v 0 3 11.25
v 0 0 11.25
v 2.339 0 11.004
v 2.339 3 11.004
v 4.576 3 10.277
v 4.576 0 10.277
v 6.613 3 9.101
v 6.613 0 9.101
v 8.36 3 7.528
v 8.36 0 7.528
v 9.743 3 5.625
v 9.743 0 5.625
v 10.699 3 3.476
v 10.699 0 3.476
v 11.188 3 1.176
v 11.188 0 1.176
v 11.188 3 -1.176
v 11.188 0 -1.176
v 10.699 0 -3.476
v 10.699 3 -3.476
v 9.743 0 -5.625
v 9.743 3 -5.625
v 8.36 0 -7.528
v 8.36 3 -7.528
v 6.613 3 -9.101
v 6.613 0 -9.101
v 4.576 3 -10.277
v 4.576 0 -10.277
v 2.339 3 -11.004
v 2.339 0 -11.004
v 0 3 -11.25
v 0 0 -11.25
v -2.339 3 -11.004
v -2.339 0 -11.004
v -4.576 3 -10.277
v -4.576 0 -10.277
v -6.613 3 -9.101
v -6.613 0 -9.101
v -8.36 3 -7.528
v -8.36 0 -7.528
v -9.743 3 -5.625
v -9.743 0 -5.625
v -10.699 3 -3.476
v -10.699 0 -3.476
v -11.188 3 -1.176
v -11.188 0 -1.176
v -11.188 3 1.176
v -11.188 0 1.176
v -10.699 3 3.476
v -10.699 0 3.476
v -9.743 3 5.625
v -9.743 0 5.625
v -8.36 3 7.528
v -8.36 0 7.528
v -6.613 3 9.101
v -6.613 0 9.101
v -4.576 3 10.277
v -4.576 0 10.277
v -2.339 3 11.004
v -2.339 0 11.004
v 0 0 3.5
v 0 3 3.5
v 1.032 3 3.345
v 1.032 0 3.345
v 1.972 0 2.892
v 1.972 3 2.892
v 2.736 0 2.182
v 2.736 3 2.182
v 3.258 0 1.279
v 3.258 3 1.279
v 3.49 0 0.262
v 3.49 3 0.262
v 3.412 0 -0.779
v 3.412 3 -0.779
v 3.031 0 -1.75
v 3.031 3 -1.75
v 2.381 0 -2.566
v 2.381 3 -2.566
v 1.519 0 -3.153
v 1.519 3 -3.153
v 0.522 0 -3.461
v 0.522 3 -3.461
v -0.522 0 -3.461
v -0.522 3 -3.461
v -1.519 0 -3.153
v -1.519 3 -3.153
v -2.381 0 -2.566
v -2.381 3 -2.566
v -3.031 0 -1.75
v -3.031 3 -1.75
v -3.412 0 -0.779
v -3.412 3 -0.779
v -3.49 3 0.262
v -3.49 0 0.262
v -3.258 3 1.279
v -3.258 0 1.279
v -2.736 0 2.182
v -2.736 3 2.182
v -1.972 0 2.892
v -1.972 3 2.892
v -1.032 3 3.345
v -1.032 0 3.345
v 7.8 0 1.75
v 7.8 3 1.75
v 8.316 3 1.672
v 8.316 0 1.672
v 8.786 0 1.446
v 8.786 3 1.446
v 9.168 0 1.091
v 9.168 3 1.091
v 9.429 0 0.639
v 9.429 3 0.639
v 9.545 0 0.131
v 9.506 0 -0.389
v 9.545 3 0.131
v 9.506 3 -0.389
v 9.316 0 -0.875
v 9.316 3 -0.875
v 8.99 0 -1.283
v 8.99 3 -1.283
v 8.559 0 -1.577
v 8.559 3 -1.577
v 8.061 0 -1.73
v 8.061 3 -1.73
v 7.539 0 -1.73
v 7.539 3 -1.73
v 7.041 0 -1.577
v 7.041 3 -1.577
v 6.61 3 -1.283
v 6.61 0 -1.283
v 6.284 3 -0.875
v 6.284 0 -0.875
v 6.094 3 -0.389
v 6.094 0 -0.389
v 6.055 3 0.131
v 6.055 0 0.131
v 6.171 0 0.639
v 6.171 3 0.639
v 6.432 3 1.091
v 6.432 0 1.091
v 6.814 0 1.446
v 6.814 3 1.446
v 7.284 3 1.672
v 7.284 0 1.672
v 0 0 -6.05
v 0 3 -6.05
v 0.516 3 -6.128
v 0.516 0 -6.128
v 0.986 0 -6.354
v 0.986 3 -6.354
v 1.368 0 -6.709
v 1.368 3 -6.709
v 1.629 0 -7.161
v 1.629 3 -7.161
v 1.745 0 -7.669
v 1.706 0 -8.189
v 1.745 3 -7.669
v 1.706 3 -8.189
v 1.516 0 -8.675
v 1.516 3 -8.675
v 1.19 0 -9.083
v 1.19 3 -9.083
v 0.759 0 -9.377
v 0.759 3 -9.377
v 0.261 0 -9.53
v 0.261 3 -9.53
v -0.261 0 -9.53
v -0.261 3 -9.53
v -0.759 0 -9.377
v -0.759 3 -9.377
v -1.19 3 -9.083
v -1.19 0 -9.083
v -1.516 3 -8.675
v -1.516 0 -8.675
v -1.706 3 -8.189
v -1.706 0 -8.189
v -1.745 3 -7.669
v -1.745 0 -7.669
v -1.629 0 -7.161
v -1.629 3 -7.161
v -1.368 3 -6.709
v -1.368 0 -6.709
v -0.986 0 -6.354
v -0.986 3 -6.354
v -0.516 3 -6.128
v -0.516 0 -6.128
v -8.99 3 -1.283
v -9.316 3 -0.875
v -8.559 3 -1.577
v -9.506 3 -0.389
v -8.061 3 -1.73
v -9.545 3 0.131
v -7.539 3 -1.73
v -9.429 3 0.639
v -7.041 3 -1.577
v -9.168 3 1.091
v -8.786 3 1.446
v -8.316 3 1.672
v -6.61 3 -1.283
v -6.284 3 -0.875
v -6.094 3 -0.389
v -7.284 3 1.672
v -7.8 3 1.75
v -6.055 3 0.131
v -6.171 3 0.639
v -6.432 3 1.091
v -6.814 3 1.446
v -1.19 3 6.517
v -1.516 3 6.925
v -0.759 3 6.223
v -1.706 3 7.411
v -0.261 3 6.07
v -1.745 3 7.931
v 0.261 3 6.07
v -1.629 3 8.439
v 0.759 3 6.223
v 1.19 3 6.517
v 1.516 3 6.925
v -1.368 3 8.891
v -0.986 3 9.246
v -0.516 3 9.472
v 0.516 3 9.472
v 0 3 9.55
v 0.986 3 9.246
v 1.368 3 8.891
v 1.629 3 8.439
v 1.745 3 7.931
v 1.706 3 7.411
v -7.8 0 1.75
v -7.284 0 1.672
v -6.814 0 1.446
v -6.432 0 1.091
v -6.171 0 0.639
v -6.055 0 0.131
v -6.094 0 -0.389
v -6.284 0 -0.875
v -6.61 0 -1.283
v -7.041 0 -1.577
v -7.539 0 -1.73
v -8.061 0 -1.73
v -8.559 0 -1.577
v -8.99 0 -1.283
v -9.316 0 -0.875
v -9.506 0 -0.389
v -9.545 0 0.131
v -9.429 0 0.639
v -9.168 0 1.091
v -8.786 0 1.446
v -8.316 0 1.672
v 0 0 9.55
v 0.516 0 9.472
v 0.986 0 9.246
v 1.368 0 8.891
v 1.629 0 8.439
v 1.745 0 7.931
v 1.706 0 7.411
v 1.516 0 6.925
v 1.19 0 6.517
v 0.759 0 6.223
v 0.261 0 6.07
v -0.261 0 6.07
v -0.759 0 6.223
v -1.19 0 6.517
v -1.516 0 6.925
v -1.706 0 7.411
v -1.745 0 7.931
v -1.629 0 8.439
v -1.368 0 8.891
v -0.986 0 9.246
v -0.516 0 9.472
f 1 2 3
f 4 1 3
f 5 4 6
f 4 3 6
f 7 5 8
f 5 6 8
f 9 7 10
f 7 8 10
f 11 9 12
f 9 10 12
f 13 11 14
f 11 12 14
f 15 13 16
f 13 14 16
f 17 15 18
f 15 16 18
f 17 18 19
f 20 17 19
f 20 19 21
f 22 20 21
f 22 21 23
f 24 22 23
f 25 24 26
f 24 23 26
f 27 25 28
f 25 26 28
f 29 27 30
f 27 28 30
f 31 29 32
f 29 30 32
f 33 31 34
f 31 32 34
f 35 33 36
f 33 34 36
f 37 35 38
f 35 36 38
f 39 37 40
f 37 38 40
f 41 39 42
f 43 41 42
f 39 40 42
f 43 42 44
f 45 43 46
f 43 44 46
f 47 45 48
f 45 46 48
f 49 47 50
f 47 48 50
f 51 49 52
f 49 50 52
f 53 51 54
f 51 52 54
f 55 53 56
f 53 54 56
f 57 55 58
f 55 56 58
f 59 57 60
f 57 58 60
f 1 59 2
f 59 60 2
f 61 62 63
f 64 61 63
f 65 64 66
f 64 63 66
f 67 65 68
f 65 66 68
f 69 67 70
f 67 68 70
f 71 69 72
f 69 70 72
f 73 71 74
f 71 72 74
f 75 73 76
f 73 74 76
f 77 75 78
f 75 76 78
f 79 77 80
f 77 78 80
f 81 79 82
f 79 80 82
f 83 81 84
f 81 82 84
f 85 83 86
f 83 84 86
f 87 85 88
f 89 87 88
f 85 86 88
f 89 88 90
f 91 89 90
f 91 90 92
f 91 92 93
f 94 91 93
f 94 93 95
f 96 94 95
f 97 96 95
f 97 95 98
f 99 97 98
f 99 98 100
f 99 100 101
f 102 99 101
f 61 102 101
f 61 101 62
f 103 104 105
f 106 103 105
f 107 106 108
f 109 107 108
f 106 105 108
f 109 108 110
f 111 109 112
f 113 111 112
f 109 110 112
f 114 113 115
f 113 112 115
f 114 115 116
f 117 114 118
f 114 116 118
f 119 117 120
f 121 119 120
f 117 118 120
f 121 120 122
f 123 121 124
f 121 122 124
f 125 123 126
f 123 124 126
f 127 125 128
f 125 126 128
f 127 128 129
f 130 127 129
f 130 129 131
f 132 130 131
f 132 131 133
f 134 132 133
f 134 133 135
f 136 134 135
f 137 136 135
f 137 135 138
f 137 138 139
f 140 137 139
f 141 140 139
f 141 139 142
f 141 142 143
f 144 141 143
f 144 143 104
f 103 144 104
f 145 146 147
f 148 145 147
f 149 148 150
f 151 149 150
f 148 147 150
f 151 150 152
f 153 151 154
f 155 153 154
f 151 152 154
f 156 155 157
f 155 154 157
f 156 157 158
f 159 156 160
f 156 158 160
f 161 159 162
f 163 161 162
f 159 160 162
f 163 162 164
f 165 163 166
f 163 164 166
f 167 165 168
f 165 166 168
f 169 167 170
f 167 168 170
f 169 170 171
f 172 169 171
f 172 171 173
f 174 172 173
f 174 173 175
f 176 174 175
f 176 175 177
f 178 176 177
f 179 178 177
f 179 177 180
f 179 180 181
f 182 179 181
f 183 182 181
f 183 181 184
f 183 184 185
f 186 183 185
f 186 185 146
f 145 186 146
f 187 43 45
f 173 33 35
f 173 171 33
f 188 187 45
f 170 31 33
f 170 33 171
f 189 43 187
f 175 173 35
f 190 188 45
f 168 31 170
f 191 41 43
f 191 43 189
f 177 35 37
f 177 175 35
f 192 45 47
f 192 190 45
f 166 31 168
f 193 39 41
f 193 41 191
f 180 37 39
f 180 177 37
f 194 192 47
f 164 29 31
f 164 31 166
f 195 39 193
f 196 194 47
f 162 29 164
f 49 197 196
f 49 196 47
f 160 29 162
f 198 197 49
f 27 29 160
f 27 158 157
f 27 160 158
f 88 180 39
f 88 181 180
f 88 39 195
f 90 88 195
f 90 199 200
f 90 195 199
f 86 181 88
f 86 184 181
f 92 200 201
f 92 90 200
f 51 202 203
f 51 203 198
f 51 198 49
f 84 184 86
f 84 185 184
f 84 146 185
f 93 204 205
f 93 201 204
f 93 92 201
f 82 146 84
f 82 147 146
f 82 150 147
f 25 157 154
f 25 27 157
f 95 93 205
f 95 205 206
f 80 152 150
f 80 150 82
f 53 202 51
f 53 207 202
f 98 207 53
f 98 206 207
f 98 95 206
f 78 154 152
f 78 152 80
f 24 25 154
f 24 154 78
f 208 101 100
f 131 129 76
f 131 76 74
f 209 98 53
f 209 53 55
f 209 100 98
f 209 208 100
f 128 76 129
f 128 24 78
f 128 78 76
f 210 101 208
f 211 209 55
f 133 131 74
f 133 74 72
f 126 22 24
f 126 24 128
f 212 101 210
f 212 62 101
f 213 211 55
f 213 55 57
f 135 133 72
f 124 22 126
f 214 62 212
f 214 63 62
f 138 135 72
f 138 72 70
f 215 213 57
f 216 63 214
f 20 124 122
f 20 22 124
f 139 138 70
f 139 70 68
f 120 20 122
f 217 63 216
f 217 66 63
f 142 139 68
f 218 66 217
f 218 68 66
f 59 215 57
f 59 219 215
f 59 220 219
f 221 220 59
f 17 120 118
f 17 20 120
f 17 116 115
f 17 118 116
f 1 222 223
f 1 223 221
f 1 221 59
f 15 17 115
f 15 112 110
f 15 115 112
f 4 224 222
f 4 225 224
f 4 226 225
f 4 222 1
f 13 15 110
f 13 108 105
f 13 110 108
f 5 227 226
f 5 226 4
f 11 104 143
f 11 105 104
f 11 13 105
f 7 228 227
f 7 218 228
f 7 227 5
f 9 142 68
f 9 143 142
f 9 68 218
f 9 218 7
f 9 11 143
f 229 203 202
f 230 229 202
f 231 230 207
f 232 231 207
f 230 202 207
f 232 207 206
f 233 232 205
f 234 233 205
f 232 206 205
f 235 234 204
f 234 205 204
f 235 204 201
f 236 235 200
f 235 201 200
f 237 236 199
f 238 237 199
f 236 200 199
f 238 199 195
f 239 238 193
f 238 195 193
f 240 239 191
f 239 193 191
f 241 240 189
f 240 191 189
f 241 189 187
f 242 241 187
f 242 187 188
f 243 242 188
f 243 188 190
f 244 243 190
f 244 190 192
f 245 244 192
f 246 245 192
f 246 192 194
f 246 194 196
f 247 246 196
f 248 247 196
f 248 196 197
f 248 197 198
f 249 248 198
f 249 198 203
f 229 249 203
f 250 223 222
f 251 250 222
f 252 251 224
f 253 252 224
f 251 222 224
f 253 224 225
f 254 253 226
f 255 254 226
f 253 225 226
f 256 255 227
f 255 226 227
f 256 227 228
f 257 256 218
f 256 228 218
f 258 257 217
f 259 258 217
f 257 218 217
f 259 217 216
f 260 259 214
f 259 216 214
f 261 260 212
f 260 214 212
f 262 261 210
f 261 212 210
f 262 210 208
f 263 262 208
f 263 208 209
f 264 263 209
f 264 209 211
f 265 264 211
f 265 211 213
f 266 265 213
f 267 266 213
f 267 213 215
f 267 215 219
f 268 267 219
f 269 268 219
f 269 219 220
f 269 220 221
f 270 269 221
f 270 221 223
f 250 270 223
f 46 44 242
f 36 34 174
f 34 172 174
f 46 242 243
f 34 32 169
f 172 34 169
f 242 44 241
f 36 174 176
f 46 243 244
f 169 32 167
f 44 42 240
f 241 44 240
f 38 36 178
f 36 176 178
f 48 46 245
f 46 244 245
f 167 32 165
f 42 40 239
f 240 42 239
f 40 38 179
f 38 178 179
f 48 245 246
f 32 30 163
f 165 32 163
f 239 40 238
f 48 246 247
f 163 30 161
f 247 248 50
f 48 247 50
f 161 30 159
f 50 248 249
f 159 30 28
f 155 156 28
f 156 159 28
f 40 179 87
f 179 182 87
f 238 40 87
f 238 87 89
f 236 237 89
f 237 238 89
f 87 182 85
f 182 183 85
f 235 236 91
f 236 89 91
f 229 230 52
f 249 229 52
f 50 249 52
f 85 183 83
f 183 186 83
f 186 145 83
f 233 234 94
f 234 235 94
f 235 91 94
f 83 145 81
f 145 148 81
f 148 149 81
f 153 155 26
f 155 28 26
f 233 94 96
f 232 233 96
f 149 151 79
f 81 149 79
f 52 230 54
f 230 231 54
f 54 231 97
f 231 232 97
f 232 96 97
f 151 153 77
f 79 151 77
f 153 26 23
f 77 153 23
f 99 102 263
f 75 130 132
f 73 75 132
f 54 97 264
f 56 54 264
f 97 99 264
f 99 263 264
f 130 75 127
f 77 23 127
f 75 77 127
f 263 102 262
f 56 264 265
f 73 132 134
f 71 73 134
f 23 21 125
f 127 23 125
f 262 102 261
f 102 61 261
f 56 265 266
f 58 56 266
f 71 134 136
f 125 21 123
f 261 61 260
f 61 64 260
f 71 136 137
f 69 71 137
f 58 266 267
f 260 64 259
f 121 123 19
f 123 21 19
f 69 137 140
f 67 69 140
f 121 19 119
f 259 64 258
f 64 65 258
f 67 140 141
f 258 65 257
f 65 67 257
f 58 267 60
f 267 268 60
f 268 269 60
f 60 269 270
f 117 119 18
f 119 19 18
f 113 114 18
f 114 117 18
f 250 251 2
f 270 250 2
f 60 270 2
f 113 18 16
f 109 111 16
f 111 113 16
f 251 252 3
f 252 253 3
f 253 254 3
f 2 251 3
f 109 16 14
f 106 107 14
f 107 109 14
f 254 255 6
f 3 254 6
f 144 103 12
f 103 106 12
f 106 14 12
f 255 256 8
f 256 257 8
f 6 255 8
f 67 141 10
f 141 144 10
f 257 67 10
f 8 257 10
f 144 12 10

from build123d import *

# Parameters (mm, degrees)
SKETCH1_R           = 11.25
BOSS_EXTRUDE1_DEPTH = 3
CUT_EXTRUDE1_REACH  = 18.19
SKETCH2_R           = 1.75
SKETCH2_R_2         = 3.5


with BuildPart() as part:
    # Sketch1 → Boss-Extrude1 (new body)
    with BuildSketch(Plane(origin=(0, 0, 0), x_dir=(1, 0, 0), z_dir=(0, 1, 0))):
        with Locations(Location((0, 0, 0), (0, 0, 270))):
            Circle(SKETCH1_R)
    extrude(amount=BOSS_EXTRUDE1_DEPTH)

    # Sketch2 → Cut-Extrude1 (cut, up to next)
    with BuildSketch(Plane(origin=(0, 3, 0), x_dir=(1, 0, 0), z_dir=(0, 1, 0)), mode=Mode.PRIVATE) as cut_extrude1_sk1:
        with Locations(Location((0, 7.8, 0), (0, 0, 270))):
            Circle(SKETCH2_R)
    cut_extrude1_tool1 = extrude(cut_extrude1_sk1.sketch, amount=-CUT_EXTRUDE1_REACH, mode=Mode.PRIVATE) & part.part
    # Sketch2 → Cut-Extrude1 (cut, up to next)
    with BuildSketch(Plane(origin=(0, 3, 0), x_dir=(1, 0, 0), z_dir=(0, 1, 0)), mode=Mode.PRIVATE) as cut_extrude1_sk2:
        with Locations(Location((7.8, 0, 0), (0, 0, 270))):
            Circle(SKETCH2_R)
    cut_extrude1_tool2 = extrude(cut_extrude1_sk2.sketch, amount=-CUT_EXTRUDE1_REACH, mode=Mode.PRIVATE) & part.part
    # Sketch2 → Cut-Extrude1 (cut, up to next)
    with BuildSketch(Plane(origin=(0, 3, 0), x_dir=(1, 0, 0), z_dir=(0, 1, 0)), mode=Mode.PRIVATE) as cut_extrude1_sk3:
        with Locations(Location((0, -7.8, 0), (0, 0, 270))):
            Circle(SKETCH2_R)
    cut_extrude1_tool3 = extrude(cut_extrude1_sk3.sketch, amount=-CUT_EXTRUDE1_REACH, mode=Mode.PRIVATE) & part.part
    # Sketch2 → Cut-Extrude1 (cut, up to next)
    with BuildSketch(Plane(origin=(0, 3, 0), x_dir=(1, 0, 0), z_dir=(0, 1, 0)), mode=Mode.PRIVATE) as cut_extrude1_sk4:
        with Locations(Location((-7.8, 0, 0), (0, 0, 270))):
            Circle(SKETCH2_R)
    cut_extrude1_tool4 = extrude(cut_extrude1_sk4.sketch, amount=-CUT_EXTRUDE1_REACH, mode=Mode.PRIVATE) & part.part
    # Sketch2 → Cut-Extrude1 (cut, up to next)
    with BuildSketch(Plane(origin=(0, 3, 0), x_dir=(1, 0, 0), z_dir=(0, 1, 0)), mode=Mode.PRIVATE) as cut_extrude1_sk5:
        with Locations(Location((0, 0, 0), (0, 0, 270))):
            Circle(SKETCH2_R_2)
    cut_extrude1_tool5 = extrude(cut_extrude1_sk5.sketch, amount=-CUT_EXTRUDE1_REACH, mode=Mode.PRIVATE) & part.part
    add(cut_extrude1_tool1.solids().sort_by_distance((0, 3, -7.8))[0], mode=Mode.SUBTRACT)
    add(cut_extrude1_tool2.solids().sort_by_distance((7.8, 3, 0))[0], mode=Mode.SUBTRACT)
    add(cut_extrude1_tool3.solids().sort_by_distance((0, 3, 7.8))[0], mode=Mode.SUBTRACT)
    add(cut_extrude1_tool4.solids().sort_by_distance((-7.8, 3, 0))[0], mode=Mode.SUBTRACT)
    add(cut_extrude1_tool5.solids().sort_by_distance((0, 3, 0))[0], mode=Mode.SUBTRACT)


solid = part.part
